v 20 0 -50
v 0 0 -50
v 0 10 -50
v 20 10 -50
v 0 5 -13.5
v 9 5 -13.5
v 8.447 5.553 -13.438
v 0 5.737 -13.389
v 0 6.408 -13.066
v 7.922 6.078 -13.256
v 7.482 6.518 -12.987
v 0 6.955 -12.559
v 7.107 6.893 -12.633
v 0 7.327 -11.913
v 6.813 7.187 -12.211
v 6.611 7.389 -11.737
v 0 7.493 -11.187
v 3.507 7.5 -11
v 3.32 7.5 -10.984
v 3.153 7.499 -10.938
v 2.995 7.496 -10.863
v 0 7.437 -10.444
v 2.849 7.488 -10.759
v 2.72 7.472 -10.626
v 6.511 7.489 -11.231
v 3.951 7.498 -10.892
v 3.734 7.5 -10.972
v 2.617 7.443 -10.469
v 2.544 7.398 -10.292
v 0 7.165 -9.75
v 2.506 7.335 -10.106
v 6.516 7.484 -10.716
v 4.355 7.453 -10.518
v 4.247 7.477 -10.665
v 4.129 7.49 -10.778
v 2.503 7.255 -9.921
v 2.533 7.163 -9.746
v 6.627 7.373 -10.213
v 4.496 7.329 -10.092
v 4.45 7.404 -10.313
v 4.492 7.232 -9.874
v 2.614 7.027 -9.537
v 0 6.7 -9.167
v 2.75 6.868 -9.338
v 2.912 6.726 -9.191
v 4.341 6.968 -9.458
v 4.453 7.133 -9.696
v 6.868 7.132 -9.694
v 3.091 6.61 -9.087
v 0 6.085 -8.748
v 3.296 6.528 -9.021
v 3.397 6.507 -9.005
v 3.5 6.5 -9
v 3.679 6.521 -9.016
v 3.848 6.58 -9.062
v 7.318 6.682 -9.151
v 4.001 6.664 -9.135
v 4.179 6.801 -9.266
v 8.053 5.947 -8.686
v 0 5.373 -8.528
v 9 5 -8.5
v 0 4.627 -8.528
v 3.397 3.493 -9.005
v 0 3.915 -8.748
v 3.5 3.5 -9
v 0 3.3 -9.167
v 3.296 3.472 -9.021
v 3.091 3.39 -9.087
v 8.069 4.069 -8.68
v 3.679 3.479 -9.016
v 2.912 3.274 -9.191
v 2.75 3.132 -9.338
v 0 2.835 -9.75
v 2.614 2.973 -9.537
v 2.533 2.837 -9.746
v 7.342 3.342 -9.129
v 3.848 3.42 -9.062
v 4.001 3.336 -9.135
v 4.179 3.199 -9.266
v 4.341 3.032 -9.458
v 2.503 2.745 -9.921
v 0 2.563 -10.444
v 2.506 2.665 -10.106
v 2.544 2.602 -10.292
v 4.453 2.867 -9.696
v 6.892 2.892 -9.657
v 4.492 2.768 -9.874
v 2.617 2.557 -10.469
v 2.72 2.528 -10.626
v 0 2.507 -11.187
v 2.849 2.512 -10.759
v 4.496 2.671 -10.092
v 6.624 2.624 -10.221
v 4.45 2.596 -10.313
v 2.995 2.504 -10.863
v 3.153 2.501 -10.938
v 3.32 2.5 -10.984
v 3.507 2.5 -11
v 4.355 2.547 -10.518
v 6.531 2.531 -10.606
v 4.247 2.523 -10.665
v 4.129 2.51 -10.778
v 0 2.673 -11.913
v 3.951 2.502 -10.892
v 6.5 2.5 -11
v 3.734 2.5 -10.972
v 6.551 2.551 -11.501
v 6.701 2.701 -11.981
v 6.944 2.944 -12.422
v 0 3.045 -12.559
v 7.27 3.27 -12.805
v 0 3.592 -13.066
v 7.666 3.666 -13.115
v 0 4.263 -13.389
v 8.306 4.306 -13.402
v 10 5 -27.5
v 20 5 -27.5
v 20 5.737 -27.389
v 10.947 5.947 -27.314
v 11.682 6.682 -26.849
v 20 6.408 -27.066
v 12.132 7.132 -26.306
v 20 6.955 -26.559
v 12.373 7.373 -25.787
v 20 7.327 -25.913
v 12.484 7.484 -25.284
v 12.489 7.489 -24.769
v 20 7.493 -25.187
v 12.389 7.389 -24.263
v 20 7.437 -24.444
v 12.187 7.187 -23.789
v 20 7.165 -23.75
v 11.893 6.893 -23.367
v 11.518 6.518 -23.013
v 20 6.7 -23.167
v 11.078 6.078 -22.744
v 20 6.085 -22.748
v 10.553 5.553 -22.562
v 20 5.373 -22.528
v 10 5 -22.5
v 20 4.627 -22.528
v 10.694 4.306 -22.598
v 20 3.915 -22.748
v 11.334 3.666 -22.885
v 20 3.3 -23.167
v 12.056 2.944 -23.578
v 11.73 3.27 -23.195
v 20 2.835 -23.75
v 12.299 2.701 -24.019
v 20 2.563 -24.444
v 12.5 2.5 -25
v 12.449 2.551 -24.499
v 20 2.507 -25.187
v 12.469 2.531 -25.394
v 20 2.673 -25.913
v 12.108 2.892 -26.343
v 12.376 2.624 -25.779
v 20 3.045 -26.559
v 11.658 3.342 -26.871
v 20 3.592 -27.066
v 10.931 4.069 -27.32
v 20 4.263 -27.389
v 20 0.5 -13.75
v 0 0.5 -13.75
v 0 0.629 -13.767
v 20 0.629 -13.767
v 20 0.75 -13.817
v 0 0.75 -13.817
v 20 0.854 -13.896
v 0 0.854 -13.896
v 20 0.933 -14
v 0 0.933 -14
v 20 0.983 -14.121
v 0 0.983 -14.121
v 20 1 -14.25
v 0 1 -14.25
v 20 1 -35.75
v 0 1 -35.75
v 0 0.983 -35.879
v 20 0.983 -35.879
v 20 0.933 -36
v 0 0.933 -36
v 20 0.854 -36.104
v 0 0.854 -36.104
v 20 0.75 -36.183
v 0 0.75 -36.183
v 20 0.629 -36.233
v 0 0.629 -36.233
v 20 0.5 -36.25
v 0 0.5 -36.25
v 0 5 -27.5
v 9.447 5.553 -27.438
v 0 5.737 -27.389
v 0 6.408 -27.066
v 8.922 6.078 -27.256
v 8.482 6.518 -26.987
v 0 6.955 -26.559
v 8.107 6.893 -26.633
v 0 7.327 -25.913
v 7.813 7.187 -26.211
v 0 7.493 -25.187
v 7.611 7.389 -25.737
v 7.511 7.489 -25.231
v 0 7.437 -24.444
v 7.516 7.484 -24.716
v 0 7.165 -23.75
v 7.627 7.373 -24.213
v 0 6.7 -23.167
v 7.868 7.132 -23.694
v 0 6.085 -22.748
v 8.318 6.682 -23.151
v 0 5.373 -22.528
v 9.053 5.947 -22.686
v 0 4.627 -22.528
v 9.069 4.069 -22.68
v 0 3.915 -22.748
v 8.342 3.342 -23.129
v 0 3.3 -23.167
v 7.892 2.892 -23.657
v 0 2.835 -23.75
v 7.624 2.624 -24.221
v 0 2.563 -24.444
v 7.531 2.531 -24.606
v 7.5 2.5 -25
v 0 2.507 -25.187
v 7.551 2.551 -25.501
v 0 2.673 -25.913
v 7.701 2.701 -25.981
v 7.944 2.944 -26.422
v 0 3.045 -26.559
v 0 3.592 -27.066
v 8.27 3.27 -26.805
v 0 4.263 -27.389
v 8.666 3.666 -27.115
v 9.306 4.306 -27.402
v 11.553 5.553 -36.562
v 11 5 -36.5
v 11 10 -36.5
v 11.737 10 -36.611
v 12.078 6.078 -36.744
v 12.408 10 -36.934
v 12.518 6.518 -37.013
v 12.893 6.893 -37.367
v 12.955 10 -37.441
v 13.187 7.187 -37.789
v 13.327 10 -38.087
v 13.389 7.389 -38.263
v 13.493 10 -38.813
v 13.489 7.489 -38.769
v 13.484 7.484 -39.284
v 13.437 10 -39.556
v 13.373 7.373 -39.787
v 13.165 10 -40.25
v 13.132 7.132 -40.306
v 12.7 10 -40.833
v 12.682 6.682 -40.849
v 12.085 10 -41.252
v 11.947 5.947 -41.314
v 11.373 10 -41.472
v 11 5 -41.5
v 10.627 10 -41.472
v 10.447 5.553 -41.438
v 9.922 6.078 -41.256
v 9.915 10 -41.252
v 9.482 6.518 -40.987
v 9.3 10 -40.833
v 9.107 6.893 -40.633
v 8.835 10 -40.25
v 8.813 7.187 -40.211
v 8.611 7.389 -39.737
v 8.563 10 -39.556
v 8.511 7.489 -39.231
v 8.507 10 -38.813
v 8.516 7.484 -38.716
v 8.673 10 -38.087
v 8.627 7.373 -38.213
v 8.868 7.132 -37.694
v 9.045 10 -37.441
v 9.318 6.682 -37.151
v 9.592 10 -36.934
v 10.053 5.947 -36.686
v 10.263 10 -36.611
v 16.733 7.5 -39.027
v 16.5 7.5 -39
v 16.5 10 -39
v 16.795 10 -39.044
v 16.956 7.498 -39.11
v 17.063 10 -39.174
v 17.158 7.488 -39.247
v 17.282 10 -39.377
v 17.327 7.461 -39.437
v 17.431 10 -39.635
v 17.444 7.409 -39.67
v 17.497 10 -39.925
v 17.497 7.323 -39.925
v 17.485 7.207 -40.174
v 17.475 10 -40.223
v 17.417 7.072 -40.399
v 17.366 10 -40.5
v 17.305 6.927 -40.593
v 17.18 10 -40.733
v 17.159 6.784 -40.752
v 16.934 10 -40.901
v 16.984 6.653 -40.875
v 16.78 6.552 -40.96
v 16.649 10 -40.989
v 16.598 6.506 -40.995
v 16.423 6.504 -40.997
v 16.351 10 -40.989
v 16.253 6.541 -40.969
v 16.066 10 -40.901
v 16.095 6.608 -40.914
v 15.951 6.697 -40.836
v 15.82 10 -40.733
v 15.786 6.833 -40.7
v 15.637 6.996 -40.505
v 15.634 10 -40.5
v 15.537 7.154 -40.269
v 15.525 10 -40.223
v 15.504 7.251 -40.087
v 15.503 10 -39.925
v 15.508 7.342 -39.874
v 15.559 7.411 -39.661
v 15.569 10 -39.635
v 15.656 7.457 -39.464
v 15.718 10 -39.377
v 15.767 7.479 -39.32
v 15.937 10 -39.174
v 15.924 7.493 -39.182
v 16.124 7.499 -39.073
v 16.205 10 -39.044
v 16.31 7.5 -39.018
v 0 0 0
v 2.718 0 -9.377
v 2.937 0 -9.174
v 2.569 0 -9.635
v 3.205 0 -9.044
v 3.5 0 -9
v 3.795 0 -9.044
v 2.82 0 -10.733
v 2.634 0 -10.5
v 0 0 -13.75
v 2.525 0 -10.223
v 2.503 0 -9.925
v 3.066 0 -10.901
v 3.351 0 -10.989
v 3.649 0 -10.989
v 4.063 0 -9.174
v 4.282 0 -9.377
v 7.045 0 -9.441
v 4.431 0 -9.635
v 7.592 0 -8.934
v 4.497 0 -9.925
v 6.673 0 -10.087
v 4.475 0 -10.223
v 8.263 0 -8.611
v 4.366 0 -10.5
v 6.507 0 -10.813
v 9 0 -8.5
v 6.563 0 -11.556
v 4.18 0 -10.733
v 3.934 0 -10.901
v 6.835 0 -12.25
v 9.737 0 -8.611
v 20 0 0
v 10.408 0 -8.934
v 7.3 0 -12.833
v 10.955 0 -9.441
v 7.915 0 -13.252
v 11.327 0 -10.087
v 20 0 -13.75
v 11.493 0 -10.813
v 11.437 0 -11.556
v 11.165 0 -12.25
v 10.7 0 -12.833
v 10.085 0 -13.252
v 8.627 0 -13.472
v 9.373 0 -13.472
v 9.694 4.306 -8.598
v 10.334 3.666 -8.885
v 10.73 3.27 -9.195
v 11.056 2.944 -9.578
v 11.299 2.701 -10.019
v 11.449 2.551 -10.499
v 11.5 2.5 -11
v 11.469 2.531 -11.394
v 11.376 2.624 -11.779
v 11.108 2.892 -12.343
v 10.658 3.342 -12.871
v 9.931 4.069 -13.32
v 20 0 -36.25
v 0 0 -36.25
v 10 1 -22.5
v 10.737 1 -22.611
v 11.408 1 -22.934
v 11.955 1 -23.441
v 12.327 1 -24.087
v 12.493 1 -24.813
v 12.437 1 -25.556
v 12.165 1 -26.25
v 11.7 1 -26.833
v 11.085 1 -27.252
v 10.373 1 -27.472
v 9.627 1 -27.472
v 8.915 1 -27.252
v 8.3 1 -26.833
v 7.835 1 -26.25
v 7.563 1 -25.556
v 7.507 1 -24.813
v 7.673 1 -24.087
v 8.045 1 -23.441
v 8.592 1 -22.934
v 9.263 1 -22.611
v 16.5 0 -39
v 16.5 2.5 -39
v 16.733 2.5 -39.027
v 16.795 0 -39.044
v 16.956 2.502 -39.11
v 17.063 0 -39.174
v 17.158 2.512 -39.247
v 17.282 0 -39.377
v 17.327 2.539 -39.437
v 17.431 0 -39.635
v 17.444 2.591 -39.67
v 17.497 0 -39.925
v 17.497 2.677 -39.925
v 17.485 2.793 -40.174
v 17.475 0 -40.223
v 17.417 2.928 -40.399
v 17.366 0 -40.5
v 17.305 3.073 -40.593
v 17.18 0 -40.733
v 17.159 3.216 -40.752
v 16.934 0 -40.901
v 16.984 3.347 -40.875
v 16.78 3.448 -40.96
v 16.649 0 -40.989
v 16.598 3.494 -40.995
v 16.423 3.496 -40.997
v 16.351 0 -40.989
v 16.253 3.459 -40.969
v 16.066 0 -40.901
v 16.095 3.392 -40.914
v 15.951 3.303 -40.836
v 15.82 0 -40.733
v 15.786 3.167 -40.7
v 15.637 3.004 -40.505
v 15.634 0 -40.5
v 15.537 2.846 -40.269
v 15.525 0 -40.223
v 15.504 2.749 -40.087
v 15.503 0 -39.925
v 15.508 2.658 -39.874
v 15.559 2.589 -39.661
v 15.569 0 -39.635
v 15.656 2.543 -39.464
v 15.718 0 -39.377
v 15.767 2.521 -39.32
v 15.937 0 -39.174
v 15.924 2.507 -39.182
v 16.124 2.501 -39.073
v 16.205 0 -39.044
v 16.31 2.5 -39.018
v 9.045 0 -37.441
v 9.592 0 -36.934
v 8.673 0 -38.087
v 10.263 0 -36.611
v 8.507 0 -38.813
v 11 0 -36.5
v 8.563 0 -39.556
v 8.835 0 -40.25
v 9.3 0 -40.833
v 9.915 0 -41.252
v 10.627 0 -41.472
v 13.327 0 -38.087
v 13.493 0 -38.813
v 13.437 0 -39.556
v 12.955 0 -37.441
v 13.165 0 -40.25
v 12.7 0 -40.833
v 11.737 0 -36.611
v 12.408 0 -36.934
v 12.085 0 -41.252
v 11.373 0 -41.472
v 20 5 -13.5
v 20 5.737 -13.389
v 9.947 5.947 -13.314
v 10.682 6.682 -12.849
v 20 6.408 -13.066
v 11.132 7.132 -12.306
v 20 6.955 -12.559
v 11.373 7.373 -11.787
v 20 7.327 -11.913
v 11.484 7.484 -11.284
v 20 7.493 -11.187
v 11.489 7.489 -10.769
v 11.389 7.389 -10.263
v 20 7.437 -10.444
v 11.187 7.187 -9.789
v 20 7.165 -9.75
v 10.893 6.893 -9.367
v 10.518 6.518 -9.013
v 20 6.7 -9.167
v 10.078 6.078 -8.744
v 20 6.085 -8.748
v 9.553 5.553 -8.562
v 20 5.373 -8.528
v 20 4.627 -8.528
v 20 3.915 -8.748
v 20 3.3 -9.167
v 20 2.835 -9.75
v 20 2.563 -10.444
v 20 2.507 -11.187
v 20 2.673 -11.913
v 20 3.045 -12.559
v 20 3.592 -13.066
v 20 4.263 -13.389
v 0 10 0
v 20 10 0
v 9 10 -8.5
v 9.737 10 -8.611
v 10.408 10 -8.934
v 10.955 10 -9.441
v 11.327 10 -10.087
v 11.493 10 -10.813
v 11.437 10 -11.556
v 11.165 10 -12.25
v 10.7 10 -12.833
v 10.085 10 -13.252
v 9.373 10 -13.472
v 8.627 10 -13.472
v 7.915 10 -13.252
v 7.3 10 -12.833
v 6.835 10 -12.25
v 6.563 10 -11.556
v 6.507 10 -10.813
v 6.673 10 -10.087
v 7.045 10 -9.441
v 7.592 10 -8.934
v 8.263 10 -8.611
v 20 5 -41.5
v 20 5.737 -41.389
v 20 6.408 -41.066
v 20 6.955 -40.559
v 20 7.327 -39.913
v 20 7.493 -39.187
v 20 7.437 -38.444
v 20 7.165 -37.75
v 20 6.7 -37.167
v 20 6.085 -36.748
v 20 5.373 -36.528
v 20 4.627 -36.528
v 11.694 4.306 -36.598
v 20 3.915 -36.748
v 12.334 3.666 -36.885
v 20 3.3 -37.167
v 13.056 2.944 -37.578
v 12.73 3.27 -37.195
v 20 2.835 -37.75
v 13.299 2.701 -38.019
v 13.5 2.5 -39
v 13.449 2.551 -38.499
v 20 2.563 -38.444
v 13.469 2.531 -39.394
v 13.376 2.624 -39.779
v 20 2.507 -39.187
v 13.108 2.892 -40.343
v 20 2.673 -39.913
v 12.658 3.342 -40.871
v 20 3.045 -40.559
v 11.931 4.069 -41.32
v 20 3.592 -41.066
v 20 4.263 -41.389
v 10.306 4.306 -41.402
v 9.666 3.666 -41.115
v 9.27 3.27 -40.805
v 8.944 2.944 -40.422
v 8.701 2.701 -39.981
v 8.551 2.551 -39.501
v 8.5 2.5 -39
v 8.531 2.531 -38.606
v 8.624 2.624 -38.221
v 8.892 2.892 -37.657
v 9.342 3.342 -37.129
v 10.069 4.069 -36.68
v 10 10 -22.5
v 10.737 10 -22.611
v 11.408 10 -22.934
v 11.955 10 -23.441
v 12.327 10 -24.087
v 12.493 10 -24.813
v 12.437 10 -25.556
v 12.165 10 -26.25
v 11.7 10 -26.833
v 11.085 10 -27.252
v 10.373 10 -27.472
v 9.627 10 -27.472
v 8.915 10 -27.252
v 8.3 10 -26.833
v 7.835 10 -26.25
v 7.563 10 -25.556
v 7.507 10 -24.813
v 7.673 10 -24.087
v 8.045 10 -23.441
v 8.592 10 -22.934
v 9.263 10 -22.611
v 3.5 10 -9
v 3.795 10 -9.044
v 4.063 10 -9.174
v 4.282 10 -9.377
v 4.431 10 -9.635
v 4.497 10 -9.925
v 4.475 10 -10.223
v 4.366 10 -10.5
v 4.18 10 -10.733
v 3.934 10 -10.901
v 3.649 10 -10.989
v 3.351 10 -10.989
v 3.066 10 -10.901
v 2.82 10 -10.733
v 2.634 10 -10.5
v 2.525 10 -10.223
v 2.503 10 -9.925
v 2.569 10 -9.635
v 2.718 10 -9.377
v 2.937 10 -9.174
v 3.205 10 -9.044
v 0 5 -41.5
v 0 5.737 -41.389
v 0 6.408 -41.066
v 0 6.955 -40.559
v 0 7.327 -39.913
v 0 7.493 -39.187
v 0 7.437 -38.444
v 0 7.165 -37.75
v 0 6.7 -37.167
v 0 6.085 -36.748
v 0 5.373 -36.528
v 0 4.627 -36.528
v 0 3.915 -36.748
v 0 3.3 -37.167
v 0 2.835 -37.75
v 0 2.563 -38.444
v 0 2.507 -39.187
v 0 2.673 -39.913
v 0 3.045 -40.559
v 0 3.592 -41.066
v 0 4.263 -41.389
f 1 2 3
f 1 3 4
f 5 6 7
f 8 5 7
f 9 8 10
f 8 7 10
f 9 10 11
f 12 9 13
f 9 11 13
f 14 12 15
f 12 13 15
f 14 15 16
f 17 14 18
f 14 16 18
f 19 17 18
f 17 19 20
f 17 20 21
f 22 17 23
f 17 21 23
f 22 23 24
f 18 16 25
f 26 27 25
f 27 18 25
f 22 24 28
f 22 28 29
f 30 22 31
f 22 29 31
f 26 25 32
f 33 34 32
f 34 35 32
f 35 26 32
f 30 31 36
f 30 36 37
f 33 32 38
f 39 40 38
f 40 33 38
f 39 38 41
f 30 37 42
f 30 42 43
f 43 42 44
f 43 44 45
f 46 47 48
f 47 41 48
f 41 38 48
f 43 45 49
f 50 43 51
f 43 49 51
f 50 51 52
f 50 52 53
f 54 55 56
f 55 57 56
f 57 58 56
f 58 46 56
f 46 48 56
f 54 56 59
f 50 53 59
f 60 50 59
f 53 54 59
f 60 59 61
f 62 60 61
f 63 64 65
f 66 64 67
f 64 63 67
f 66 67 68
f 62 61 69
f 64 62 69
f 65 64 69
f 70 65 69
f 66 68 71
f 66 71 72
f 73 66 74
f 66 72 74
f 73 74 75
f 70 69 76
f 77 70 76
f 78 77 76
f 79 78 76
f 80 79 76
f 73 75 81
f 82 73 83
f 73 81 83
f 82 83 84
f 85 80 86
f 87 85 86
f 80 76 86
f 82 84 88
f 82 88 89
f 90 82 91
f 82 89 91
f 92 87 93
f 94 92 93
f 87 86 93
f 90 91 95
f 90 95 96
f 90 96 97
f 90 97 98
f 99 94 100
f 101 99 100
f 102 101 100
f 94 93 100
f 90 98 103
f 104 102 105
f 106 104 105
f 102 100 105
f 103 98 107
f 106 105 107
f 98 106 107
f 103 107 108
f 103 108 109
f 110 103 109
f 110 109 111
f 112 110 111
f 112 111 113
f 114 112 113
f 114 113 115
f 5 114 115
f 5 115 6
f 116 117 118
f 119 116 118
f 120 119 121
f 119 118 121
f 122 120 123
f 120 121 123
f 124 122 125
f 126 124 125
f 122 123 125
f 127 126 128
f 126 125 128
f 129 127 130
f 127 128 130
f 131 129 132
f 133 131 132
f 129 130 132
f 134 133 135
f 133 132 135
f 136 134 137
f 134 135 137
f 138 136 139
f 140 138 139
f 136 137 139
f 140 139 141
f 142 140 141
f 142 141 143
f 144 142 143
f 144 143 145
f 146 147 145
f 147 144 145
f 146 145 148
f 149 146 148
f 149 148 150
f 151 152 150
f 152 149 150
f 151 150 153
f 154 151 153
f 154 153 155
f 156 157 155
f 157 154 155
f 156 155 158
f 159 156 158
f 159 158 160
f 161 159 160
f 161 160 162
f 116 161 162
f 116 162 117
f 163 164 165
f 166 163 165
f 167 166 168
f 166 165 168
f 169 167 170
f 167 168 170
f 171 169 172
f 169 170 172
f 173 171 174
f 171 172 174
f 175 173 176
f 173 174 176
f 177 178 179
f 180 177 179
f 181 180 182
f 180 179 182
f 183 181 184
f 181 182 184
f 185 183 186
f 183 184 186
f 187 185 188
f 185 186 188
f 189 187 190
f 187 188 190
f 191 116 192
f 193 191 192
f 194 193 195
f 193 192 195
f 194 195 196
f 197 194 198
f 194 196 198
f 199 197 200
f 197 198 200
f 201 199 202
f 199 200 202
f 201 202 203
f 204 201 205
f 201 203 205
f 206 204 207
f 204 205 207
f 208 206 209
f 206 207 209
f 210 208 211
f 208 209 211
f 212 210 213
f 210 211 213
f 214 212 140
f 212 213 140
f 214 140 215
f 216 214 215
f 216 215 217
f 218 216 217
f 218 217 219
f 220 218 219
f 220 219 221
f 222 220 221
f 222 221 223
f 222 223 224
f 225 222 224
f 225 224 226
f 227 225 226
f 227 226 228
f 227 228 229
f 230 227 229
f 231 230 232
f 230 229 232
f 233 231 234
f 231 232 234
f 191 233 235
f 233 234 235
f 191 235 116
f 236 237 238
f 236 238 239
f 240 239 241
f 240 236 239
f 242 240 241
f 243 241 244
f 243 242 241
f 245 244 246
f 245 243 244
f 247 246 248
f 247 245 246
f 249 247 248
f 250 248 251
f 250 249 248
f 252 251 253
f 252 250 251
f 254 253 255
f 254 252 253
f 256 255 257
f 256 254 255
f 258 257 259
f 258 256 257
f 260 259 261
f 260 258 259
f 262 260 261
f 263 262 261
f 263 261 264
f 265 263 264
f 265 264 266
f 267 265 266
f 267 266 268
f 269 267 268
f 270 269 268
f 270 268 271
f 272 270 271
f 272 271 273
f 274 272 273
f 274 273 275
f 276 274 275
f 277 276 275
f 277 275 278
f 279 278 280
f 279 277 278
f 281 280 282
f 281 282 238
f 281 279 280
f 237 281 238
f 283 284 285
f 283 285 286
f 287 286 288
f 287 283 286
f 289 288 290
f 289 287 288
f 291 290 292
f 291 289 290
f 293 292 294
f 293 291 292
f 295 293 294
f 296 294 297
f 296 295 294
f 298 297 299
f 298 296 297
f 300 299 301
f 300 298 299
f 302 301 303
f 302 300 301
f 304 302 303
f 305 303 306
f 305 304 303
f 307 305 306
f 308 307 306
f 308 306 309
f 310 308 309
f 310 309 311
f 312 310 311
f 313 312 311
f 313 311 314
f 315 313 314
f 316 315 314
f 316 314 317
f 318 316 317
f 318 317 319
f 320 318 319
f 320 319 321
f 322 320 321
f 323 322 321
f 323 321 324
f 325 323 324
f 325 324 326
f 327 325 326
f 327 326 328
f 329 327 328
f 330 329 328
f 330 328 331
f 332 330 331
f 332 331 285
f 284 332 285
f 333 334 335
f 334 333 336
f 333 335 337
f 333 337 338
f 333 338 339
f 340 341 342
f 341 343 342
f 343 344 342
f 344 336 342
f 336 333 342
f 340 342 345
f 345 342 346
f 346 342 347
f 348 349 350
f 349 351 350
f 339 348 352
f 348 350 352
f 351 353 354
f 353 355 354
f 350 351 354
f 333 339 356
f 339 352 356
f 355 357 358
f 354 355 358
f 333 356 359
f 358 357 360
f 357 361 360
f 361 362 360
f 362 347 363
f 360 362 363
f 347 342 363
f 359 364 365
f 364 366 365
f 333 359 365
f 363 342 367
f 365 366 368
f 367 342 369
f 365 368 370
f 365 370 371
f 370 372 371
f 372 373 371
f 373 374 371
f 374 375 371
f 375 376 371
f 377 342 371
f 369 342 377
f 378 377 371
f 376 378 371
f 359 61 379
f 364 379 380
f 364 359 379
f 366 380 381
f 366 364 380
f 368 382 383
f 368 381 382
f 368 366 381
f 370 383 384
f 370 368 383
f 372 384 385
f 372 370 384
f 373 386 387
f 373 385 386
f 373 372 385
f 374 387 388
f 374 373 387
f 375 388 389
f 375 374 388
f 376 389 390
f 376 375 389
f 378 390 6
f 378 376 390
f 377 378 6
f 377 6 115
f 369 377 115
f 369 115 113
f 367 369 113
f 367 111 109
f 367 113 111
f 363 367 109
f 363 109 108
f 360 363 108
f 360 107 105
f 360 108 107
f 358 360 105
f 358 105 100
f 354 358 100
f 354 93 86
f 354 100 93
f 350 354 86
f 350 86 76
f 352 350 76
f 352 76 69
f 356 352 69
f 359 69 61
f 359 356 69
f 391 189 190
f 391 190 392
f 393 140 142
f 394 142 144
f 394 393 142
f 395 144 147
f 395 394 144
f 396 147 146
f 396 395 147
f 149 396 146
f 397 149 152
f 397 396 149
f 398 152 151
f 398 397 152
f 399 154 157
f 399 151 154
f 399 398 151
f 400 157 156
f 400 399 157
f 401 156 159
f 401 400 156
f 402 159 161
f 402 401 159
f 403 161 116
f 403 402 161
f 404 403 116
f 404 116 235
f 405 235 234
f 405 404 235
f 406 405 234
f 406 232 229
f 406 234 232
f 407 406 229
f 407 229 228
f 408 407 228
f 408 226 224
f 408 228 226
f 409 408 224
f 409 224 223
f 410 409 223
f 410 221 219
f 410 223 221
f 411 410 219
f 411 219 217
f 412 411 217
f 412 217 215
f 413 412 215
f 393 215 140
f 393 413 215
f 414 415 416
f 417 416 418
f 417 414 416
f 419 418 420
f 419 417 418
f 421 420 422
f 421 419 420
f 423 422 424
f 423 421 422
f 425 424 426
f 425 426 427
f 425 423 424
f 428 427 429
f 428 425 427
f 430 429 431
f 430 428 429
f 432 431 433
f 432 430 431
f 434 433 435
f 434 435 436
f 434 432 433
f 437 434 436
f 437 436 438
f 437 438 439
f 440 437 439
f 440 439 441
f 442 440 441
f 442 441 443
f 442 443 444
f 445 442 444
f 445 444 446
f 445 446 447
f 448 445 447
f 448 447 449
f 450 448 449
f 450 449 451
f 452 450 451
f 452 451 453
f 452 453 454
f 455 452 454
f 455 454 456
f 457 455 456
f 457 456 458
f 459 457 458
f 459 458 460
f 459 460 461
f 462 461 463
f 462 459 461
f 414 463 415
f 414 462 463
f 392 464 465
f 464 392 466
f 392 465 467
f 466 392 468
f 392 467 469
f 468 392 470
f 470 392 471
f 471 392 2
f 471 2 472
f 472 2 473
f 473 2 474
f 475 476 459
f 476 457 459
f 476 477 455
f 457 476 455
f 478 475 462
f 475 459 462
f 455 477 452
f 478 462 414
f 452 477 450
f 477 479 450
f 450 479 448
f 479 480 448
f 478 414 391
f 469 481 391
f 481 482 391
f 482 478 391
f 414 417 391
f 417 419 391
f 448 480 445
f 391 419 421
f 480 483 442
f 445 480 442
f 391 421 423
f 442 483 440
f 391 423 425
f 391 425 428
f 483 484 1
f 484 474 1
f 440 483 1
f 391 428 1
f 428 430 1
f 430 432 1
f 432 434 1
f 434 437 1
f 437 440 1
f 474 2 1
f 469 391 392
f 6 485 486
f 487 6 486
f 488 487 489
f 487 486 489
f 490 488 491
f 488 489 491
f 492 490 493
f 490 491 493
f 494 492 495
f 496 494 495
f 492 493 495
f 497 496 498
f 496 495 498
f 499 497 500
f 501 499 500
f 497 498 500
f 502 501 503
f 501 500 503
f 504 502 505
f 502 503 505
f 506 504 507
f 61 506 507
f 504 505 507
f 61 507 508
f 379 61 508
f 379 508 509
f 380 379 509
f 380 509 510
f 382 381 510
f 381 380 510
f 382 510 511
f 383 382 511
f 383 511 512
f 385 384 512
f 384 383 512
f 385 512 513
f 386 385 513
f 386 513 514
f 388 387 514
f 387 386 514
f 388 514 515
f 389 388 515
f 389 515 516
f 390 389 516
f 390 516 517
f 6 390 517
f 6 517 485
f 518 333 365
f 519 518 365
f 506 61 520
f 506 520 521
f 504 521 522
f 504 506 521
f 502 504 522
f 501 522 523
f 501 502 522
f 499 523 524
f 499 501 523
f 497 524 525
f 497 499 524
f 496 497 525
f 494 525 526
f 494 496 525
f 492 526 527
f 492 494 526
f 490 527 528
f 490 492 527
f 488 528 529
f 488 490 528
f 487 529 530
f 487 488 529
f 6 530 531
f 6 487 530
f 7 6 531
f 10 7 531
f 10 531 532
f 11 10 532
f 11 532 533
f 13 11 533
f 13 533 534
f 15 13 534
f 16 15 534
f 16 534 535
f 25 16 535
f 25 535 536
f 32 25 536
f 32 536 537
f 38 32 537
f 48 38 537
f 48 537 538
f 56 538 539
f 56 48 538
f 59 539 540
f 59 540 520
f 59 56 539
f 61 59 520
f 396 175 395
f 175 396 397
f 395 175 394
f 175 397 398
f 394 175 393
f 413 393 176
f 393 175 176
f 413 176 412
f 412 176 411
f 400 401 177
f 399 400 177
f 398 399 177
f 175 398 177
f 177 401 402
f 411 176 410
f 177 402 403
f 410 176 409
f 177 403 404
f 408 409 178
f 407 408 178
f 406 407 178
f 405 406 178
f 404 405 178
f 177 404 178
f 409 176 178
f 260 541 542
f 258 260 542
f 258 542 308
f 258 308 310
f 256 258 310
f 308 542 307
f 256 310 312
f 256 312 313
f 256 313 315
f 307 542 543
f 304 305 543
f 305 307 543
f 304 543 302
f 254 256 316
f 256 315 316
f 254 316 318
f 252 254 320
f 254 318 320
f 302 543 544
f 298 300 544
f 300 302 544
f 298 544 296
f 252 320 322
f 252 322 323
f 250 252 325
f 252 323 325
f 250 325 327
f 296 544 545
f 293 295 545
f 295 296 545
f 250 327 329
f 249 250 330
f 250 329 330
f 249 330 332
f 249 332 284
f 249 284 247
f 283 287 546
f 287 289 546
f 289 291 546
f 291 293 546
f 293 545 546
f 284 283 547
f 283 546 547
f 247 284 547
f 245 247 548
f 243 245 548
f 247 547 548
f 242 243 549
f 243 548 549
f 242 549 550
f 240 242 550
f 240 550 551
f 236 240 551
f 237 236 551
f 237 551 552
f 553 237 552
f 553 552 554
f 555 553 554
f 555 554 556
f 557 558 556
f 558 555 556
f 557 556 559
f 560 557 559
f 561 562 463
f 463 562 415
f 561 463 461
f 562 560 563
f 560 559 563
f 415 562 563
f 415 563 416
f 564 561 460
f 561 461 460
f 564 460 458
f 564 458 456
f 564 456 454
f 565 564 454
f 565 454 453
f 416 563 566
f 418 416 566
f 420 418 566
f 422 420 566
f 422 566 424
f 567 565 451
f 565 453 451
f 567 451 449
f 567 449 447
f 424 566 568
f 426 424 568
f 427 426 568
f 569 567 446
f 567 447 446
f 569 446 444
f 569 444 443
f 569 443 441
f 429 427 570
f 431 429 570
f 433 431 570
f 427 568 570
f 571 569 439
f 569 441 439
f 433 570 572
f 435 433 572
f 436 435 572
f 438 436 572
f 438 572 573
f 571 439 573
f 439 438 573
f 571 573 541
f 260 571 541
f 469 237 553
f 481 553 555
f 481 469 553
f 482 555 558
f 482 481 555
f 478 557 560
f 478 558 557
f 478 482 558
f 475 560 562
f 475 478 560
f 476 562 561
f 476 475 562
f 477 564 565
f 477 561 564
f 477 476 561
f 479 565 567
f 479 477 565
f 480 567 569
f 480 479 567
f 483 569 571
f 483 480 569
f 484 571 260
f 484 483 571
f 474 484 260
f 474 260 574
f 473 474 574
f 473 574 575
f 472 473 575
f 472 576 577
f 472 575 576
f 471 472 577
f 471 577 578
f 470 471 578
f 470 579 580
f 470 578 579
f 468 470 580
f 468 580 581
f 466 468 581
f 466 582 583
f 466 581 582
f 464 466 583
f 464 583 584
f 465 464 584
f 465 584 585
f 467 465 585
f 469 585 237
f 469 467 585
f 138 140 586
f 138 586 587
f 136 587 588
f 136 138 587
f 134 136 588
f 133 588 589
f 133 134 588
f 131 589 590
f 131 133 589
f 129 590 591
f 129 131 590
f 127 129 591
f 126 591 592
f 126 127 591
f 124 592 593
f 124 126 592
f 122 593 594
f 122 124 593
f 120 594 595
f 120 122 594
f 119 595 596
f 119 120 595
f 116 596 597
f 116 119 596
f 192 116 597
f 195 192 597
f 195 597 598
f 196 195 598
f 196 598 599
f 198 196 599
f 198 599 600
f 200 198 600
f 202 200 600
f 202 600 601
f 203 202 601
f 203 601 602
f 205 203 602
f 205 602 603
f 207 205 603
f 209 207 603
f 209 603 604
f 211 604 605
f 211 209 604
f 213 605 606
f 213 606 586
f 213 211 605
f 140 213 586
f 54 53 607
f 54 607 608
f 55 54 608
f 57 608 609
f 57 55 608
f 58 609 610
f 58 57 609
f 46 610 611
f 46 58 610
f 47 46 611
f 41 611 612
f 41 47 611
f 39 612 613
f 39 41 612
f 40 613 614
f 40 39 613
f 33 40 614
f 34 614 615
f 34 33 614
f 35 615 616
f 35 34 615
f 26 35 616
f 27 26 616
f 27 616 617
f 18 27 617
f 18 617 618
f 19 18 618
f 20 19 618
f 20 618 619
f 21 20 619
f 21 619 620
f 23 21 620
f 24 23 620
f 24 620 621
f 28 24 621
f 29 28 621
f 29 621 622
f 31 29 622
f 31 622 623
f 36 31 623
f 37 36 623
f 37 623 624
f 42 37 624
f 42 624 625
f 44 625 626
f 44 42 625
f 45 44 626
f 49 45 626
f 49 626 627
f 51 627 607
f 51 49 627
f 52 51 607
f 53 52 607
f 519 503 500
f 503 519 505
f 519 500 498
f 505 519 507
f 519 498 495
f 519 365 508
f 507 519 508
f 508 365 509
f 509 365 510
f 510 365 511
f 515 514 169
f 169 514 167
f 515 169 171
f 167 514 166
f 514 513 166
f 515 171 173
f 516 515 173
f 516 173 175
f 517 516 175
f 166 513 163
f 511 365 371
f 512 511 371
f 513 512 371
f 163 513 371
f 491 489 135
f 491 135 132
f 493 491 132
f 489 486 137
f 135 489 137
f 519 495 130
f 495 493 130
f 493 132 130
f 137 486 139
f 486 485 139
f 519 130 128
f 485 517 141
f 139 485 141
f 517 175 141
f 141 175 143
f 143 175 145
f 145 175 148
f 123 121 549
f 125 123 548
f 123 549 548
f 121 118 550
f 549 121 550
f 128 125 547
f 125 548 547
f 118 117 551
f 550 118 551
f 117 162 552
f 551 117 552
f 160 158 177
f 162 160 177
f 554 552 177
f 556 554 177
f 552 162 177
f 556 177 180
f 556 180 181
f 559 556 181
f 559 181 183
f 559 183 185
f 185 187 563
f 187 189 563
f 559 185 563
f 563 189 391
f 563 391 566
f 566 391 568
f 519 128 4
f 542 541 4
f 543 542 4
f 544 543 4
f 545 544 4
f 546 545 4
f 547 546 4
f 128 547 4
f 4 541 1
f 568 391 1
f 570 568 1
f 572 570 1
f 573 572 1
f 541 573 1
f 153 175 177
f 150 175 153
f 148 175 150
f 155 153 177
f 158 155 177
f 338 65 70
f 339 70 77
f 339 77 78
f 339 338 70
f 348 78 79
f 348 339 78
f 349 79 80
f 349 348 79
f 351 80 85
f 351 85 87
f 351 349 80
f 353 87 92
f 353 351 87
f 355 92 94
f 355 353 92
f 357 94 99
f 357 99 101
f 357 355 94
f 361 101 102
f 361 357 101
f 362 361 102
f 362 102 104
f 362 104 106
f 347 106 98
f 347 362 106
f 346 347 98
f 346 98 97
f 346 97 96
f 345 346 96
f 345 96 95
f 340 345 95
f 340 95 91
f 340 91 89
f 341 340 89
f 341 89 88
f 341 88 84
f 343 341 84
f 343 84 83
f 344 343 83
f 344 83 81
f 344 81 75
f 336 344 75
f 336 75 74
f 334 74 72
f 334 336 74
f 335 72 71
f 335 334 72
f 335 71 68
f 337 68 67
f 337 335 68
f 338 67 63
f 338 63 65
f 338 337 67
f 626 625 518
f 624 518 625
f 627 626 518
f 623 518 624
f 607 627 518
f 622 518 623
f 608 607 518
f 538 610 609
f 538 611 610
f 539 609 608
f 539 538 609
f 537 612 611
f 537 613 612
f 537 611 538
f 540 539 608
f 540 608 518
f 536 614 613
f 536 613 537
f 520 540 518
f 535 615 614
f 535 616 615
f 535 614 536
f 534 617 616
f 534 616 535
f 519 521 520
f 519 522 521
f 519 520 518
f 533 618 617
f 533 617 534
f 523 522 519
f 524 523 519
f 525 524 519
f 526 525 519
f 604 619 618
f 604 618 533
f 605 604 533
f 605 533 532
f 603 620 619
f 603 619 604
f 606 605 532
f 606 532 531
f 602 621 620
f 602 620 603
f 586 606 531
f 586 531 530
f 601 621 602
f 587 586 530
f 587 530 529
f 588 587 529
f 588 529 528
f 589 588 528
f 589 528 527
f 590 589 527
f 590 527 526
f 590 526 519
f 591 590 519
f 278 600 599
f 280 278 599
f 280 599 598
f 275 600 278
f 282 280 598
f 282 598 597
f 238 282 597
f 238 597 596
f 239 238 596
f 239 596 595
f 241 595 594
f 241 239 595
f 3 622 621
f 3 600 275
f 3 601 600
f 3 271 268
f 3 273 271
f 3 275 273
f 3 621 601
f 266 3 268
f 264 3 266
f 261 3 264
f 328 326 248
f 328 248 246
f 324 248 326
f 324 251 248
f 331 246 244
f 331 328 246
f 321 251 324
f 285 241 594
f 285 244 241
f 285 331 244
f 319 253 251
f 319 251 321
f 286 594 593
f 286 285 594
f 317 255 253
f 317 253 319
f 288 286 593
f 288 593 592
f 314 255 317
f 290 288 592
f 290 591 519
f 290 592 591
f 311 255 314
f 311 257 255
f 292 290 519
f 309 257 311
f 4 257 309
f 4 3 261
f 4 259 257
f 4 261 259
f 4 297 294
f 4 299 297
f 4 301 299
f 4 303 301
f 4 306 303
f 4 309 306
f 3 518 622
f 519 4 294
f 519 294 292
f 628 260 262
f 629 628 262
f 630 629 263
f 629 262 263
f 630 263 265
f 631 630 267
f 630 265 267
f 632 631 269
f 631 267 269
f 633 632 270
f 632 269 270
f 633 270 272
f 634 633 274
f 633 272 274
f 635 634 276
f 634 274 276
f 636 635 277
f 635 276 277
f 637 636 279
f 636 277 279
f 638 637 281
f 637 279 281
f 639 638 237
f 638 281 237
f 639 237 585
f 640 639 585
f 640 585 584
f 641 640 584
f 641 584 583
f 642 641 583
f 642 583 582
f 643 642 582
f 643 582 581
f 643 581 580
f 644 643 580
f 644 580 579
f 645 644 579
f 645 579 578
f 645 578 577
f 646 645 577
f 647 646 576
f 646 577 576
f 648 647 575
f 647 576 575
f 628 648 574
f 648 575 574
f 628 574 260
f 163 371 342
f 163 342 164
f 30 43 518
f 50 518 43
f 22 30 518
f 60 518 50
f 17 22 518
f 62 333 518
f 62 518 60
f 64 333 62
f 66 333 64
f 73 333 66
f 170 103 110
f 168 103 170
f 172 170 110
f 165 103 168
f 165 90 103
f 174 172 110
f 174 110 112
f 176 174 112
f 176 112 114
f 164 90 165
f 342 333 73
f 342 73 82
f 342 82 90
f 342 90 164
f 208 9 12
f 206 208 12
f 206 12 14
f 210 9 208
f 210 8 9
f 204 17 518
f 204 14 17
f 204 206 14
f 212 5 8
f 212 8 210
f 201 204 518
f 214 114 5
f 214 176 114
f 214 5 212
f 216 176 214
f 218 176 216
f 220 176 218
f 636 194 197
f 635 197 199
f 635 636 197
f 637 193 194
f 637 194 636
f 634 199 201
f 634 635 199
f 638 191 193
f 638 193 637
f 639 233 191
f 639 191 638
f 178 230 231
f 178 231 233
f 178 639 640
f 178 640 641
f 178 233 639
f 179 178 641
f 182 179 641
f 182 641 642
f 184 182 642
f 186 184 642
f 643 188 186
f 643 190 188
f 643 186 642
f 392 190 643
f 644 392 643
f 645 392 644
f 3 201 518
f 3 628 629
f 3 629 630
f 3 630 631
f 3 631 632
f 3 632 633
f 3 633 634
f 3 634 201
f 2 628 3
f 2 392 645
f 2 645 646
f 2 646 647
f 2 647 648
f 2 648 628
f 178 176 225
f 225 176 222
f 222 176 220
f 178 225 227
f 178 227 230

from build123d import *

# Parameters (mm, degrees)
ESQUISSE1_W             = 20
ESQUISSE1_H             = 50
ESQUISSE1_R             = 2.5
ESQUISSE1_R_2           = 1
BOSS_EXTRU_1_DEPTH      = 10
ESQUISSE2_R             = 2.5
ENL_V_MAT_EXTRU_1_DEPTH = 55.772255751
ENL_V_MAT_EXTRU_2_DEPTH = 41.175091243


with BuildPart() as part:
    # Esquisse1 → Boss.-Extru.1 (new body)
    with BuildSketch(Plane(origin=(0, 0, 0), x_dir=(1, 0, 0), z_dir=(0, 1, 0))):
        with Locations((10, 25)):
            Rectangle(ESQUISSE1_W, ESQUISSE1_H)
        with Locations(Location((10, 25, 0), (0, 0, 270))):
            Circle(ESQUISSE1_R, mode=Mode.SUBTRACT)
        with Locations(Location((11, 39, 0), (0, 0, 270))):
            Circle(ESQUISSE1_R, mode=Mode.SUBTRACT)
        with Locations(Location((9, 11, 0), (0, 0, 270))):
            Circle(ESQUISSE1_R, mode=Mode.SUBTRACT)
        with Locations(Location((16.5, 40, 0), (0, 0, 270))):
            Circle(ESQUISSE1_R_2, mode=Mode.SUBTRACT)
        with Locations(Location((3.5, 10, 0), (0, 0, 270))):
            Circle(ESQUISSE1_R_2, mode=Mode.SUBTRACT)
    extrude(amount=BOSS_EXTRU_1_DEPTH)

    # Esquisse2 → Enlèv. mat.-Extru.1 (cut, through all)
    with BuildSketch(Plane(origin=(20, 0, 0), x_dir=(0, 0, -1), z_dir=(1, 0, 0))):
        with Locations((11, 5)):
            Circle(ESQUISSE2_R)
        with Locations((25, 5)):
            Circle(ESQUISSE2_R)
        with Locations((39, 5)):
            Circle(ESQUISSE2_R)
    extrude(amount=-ENL_V_MAT_EXTRU_1_DEPTH, mode=Mode.SUBTRACT)

    # Esquisse3 → Enlèv. mat.-Extru.2 (cut, through all)
    with BuildSketch(Plane(origin=(0, -14.270103986, -25), x_dir=(0, 0, 1), z_dir=(-1, 0, 0))):
        with BuildLine():
            Line((-11.25, 14.270103986), (11.25, 14.270103986))
            Line((11.25, 14.270103986), (11.25, 14.770103986))
            ThreePointArc((11.25, 14.770103986), (11.103553391, 15.123657377), (10.75, 15.270103986))
            Line((10.75, 15.270103986), (-10.75, 15.270103986))
            ThreePointArc((-10.75, 15.270103986), (-11.103553391, 15.123657377), (-11.25, 14.770103986))
            Line((-11.25, 14.770103986), (-11.25, 14.270103986))
        make_face()
    extrude(amount=-ENL_V_MAT_EXTRU_2_DEPTH, mode=Mode.SUBTRACT)


solid = part.part
